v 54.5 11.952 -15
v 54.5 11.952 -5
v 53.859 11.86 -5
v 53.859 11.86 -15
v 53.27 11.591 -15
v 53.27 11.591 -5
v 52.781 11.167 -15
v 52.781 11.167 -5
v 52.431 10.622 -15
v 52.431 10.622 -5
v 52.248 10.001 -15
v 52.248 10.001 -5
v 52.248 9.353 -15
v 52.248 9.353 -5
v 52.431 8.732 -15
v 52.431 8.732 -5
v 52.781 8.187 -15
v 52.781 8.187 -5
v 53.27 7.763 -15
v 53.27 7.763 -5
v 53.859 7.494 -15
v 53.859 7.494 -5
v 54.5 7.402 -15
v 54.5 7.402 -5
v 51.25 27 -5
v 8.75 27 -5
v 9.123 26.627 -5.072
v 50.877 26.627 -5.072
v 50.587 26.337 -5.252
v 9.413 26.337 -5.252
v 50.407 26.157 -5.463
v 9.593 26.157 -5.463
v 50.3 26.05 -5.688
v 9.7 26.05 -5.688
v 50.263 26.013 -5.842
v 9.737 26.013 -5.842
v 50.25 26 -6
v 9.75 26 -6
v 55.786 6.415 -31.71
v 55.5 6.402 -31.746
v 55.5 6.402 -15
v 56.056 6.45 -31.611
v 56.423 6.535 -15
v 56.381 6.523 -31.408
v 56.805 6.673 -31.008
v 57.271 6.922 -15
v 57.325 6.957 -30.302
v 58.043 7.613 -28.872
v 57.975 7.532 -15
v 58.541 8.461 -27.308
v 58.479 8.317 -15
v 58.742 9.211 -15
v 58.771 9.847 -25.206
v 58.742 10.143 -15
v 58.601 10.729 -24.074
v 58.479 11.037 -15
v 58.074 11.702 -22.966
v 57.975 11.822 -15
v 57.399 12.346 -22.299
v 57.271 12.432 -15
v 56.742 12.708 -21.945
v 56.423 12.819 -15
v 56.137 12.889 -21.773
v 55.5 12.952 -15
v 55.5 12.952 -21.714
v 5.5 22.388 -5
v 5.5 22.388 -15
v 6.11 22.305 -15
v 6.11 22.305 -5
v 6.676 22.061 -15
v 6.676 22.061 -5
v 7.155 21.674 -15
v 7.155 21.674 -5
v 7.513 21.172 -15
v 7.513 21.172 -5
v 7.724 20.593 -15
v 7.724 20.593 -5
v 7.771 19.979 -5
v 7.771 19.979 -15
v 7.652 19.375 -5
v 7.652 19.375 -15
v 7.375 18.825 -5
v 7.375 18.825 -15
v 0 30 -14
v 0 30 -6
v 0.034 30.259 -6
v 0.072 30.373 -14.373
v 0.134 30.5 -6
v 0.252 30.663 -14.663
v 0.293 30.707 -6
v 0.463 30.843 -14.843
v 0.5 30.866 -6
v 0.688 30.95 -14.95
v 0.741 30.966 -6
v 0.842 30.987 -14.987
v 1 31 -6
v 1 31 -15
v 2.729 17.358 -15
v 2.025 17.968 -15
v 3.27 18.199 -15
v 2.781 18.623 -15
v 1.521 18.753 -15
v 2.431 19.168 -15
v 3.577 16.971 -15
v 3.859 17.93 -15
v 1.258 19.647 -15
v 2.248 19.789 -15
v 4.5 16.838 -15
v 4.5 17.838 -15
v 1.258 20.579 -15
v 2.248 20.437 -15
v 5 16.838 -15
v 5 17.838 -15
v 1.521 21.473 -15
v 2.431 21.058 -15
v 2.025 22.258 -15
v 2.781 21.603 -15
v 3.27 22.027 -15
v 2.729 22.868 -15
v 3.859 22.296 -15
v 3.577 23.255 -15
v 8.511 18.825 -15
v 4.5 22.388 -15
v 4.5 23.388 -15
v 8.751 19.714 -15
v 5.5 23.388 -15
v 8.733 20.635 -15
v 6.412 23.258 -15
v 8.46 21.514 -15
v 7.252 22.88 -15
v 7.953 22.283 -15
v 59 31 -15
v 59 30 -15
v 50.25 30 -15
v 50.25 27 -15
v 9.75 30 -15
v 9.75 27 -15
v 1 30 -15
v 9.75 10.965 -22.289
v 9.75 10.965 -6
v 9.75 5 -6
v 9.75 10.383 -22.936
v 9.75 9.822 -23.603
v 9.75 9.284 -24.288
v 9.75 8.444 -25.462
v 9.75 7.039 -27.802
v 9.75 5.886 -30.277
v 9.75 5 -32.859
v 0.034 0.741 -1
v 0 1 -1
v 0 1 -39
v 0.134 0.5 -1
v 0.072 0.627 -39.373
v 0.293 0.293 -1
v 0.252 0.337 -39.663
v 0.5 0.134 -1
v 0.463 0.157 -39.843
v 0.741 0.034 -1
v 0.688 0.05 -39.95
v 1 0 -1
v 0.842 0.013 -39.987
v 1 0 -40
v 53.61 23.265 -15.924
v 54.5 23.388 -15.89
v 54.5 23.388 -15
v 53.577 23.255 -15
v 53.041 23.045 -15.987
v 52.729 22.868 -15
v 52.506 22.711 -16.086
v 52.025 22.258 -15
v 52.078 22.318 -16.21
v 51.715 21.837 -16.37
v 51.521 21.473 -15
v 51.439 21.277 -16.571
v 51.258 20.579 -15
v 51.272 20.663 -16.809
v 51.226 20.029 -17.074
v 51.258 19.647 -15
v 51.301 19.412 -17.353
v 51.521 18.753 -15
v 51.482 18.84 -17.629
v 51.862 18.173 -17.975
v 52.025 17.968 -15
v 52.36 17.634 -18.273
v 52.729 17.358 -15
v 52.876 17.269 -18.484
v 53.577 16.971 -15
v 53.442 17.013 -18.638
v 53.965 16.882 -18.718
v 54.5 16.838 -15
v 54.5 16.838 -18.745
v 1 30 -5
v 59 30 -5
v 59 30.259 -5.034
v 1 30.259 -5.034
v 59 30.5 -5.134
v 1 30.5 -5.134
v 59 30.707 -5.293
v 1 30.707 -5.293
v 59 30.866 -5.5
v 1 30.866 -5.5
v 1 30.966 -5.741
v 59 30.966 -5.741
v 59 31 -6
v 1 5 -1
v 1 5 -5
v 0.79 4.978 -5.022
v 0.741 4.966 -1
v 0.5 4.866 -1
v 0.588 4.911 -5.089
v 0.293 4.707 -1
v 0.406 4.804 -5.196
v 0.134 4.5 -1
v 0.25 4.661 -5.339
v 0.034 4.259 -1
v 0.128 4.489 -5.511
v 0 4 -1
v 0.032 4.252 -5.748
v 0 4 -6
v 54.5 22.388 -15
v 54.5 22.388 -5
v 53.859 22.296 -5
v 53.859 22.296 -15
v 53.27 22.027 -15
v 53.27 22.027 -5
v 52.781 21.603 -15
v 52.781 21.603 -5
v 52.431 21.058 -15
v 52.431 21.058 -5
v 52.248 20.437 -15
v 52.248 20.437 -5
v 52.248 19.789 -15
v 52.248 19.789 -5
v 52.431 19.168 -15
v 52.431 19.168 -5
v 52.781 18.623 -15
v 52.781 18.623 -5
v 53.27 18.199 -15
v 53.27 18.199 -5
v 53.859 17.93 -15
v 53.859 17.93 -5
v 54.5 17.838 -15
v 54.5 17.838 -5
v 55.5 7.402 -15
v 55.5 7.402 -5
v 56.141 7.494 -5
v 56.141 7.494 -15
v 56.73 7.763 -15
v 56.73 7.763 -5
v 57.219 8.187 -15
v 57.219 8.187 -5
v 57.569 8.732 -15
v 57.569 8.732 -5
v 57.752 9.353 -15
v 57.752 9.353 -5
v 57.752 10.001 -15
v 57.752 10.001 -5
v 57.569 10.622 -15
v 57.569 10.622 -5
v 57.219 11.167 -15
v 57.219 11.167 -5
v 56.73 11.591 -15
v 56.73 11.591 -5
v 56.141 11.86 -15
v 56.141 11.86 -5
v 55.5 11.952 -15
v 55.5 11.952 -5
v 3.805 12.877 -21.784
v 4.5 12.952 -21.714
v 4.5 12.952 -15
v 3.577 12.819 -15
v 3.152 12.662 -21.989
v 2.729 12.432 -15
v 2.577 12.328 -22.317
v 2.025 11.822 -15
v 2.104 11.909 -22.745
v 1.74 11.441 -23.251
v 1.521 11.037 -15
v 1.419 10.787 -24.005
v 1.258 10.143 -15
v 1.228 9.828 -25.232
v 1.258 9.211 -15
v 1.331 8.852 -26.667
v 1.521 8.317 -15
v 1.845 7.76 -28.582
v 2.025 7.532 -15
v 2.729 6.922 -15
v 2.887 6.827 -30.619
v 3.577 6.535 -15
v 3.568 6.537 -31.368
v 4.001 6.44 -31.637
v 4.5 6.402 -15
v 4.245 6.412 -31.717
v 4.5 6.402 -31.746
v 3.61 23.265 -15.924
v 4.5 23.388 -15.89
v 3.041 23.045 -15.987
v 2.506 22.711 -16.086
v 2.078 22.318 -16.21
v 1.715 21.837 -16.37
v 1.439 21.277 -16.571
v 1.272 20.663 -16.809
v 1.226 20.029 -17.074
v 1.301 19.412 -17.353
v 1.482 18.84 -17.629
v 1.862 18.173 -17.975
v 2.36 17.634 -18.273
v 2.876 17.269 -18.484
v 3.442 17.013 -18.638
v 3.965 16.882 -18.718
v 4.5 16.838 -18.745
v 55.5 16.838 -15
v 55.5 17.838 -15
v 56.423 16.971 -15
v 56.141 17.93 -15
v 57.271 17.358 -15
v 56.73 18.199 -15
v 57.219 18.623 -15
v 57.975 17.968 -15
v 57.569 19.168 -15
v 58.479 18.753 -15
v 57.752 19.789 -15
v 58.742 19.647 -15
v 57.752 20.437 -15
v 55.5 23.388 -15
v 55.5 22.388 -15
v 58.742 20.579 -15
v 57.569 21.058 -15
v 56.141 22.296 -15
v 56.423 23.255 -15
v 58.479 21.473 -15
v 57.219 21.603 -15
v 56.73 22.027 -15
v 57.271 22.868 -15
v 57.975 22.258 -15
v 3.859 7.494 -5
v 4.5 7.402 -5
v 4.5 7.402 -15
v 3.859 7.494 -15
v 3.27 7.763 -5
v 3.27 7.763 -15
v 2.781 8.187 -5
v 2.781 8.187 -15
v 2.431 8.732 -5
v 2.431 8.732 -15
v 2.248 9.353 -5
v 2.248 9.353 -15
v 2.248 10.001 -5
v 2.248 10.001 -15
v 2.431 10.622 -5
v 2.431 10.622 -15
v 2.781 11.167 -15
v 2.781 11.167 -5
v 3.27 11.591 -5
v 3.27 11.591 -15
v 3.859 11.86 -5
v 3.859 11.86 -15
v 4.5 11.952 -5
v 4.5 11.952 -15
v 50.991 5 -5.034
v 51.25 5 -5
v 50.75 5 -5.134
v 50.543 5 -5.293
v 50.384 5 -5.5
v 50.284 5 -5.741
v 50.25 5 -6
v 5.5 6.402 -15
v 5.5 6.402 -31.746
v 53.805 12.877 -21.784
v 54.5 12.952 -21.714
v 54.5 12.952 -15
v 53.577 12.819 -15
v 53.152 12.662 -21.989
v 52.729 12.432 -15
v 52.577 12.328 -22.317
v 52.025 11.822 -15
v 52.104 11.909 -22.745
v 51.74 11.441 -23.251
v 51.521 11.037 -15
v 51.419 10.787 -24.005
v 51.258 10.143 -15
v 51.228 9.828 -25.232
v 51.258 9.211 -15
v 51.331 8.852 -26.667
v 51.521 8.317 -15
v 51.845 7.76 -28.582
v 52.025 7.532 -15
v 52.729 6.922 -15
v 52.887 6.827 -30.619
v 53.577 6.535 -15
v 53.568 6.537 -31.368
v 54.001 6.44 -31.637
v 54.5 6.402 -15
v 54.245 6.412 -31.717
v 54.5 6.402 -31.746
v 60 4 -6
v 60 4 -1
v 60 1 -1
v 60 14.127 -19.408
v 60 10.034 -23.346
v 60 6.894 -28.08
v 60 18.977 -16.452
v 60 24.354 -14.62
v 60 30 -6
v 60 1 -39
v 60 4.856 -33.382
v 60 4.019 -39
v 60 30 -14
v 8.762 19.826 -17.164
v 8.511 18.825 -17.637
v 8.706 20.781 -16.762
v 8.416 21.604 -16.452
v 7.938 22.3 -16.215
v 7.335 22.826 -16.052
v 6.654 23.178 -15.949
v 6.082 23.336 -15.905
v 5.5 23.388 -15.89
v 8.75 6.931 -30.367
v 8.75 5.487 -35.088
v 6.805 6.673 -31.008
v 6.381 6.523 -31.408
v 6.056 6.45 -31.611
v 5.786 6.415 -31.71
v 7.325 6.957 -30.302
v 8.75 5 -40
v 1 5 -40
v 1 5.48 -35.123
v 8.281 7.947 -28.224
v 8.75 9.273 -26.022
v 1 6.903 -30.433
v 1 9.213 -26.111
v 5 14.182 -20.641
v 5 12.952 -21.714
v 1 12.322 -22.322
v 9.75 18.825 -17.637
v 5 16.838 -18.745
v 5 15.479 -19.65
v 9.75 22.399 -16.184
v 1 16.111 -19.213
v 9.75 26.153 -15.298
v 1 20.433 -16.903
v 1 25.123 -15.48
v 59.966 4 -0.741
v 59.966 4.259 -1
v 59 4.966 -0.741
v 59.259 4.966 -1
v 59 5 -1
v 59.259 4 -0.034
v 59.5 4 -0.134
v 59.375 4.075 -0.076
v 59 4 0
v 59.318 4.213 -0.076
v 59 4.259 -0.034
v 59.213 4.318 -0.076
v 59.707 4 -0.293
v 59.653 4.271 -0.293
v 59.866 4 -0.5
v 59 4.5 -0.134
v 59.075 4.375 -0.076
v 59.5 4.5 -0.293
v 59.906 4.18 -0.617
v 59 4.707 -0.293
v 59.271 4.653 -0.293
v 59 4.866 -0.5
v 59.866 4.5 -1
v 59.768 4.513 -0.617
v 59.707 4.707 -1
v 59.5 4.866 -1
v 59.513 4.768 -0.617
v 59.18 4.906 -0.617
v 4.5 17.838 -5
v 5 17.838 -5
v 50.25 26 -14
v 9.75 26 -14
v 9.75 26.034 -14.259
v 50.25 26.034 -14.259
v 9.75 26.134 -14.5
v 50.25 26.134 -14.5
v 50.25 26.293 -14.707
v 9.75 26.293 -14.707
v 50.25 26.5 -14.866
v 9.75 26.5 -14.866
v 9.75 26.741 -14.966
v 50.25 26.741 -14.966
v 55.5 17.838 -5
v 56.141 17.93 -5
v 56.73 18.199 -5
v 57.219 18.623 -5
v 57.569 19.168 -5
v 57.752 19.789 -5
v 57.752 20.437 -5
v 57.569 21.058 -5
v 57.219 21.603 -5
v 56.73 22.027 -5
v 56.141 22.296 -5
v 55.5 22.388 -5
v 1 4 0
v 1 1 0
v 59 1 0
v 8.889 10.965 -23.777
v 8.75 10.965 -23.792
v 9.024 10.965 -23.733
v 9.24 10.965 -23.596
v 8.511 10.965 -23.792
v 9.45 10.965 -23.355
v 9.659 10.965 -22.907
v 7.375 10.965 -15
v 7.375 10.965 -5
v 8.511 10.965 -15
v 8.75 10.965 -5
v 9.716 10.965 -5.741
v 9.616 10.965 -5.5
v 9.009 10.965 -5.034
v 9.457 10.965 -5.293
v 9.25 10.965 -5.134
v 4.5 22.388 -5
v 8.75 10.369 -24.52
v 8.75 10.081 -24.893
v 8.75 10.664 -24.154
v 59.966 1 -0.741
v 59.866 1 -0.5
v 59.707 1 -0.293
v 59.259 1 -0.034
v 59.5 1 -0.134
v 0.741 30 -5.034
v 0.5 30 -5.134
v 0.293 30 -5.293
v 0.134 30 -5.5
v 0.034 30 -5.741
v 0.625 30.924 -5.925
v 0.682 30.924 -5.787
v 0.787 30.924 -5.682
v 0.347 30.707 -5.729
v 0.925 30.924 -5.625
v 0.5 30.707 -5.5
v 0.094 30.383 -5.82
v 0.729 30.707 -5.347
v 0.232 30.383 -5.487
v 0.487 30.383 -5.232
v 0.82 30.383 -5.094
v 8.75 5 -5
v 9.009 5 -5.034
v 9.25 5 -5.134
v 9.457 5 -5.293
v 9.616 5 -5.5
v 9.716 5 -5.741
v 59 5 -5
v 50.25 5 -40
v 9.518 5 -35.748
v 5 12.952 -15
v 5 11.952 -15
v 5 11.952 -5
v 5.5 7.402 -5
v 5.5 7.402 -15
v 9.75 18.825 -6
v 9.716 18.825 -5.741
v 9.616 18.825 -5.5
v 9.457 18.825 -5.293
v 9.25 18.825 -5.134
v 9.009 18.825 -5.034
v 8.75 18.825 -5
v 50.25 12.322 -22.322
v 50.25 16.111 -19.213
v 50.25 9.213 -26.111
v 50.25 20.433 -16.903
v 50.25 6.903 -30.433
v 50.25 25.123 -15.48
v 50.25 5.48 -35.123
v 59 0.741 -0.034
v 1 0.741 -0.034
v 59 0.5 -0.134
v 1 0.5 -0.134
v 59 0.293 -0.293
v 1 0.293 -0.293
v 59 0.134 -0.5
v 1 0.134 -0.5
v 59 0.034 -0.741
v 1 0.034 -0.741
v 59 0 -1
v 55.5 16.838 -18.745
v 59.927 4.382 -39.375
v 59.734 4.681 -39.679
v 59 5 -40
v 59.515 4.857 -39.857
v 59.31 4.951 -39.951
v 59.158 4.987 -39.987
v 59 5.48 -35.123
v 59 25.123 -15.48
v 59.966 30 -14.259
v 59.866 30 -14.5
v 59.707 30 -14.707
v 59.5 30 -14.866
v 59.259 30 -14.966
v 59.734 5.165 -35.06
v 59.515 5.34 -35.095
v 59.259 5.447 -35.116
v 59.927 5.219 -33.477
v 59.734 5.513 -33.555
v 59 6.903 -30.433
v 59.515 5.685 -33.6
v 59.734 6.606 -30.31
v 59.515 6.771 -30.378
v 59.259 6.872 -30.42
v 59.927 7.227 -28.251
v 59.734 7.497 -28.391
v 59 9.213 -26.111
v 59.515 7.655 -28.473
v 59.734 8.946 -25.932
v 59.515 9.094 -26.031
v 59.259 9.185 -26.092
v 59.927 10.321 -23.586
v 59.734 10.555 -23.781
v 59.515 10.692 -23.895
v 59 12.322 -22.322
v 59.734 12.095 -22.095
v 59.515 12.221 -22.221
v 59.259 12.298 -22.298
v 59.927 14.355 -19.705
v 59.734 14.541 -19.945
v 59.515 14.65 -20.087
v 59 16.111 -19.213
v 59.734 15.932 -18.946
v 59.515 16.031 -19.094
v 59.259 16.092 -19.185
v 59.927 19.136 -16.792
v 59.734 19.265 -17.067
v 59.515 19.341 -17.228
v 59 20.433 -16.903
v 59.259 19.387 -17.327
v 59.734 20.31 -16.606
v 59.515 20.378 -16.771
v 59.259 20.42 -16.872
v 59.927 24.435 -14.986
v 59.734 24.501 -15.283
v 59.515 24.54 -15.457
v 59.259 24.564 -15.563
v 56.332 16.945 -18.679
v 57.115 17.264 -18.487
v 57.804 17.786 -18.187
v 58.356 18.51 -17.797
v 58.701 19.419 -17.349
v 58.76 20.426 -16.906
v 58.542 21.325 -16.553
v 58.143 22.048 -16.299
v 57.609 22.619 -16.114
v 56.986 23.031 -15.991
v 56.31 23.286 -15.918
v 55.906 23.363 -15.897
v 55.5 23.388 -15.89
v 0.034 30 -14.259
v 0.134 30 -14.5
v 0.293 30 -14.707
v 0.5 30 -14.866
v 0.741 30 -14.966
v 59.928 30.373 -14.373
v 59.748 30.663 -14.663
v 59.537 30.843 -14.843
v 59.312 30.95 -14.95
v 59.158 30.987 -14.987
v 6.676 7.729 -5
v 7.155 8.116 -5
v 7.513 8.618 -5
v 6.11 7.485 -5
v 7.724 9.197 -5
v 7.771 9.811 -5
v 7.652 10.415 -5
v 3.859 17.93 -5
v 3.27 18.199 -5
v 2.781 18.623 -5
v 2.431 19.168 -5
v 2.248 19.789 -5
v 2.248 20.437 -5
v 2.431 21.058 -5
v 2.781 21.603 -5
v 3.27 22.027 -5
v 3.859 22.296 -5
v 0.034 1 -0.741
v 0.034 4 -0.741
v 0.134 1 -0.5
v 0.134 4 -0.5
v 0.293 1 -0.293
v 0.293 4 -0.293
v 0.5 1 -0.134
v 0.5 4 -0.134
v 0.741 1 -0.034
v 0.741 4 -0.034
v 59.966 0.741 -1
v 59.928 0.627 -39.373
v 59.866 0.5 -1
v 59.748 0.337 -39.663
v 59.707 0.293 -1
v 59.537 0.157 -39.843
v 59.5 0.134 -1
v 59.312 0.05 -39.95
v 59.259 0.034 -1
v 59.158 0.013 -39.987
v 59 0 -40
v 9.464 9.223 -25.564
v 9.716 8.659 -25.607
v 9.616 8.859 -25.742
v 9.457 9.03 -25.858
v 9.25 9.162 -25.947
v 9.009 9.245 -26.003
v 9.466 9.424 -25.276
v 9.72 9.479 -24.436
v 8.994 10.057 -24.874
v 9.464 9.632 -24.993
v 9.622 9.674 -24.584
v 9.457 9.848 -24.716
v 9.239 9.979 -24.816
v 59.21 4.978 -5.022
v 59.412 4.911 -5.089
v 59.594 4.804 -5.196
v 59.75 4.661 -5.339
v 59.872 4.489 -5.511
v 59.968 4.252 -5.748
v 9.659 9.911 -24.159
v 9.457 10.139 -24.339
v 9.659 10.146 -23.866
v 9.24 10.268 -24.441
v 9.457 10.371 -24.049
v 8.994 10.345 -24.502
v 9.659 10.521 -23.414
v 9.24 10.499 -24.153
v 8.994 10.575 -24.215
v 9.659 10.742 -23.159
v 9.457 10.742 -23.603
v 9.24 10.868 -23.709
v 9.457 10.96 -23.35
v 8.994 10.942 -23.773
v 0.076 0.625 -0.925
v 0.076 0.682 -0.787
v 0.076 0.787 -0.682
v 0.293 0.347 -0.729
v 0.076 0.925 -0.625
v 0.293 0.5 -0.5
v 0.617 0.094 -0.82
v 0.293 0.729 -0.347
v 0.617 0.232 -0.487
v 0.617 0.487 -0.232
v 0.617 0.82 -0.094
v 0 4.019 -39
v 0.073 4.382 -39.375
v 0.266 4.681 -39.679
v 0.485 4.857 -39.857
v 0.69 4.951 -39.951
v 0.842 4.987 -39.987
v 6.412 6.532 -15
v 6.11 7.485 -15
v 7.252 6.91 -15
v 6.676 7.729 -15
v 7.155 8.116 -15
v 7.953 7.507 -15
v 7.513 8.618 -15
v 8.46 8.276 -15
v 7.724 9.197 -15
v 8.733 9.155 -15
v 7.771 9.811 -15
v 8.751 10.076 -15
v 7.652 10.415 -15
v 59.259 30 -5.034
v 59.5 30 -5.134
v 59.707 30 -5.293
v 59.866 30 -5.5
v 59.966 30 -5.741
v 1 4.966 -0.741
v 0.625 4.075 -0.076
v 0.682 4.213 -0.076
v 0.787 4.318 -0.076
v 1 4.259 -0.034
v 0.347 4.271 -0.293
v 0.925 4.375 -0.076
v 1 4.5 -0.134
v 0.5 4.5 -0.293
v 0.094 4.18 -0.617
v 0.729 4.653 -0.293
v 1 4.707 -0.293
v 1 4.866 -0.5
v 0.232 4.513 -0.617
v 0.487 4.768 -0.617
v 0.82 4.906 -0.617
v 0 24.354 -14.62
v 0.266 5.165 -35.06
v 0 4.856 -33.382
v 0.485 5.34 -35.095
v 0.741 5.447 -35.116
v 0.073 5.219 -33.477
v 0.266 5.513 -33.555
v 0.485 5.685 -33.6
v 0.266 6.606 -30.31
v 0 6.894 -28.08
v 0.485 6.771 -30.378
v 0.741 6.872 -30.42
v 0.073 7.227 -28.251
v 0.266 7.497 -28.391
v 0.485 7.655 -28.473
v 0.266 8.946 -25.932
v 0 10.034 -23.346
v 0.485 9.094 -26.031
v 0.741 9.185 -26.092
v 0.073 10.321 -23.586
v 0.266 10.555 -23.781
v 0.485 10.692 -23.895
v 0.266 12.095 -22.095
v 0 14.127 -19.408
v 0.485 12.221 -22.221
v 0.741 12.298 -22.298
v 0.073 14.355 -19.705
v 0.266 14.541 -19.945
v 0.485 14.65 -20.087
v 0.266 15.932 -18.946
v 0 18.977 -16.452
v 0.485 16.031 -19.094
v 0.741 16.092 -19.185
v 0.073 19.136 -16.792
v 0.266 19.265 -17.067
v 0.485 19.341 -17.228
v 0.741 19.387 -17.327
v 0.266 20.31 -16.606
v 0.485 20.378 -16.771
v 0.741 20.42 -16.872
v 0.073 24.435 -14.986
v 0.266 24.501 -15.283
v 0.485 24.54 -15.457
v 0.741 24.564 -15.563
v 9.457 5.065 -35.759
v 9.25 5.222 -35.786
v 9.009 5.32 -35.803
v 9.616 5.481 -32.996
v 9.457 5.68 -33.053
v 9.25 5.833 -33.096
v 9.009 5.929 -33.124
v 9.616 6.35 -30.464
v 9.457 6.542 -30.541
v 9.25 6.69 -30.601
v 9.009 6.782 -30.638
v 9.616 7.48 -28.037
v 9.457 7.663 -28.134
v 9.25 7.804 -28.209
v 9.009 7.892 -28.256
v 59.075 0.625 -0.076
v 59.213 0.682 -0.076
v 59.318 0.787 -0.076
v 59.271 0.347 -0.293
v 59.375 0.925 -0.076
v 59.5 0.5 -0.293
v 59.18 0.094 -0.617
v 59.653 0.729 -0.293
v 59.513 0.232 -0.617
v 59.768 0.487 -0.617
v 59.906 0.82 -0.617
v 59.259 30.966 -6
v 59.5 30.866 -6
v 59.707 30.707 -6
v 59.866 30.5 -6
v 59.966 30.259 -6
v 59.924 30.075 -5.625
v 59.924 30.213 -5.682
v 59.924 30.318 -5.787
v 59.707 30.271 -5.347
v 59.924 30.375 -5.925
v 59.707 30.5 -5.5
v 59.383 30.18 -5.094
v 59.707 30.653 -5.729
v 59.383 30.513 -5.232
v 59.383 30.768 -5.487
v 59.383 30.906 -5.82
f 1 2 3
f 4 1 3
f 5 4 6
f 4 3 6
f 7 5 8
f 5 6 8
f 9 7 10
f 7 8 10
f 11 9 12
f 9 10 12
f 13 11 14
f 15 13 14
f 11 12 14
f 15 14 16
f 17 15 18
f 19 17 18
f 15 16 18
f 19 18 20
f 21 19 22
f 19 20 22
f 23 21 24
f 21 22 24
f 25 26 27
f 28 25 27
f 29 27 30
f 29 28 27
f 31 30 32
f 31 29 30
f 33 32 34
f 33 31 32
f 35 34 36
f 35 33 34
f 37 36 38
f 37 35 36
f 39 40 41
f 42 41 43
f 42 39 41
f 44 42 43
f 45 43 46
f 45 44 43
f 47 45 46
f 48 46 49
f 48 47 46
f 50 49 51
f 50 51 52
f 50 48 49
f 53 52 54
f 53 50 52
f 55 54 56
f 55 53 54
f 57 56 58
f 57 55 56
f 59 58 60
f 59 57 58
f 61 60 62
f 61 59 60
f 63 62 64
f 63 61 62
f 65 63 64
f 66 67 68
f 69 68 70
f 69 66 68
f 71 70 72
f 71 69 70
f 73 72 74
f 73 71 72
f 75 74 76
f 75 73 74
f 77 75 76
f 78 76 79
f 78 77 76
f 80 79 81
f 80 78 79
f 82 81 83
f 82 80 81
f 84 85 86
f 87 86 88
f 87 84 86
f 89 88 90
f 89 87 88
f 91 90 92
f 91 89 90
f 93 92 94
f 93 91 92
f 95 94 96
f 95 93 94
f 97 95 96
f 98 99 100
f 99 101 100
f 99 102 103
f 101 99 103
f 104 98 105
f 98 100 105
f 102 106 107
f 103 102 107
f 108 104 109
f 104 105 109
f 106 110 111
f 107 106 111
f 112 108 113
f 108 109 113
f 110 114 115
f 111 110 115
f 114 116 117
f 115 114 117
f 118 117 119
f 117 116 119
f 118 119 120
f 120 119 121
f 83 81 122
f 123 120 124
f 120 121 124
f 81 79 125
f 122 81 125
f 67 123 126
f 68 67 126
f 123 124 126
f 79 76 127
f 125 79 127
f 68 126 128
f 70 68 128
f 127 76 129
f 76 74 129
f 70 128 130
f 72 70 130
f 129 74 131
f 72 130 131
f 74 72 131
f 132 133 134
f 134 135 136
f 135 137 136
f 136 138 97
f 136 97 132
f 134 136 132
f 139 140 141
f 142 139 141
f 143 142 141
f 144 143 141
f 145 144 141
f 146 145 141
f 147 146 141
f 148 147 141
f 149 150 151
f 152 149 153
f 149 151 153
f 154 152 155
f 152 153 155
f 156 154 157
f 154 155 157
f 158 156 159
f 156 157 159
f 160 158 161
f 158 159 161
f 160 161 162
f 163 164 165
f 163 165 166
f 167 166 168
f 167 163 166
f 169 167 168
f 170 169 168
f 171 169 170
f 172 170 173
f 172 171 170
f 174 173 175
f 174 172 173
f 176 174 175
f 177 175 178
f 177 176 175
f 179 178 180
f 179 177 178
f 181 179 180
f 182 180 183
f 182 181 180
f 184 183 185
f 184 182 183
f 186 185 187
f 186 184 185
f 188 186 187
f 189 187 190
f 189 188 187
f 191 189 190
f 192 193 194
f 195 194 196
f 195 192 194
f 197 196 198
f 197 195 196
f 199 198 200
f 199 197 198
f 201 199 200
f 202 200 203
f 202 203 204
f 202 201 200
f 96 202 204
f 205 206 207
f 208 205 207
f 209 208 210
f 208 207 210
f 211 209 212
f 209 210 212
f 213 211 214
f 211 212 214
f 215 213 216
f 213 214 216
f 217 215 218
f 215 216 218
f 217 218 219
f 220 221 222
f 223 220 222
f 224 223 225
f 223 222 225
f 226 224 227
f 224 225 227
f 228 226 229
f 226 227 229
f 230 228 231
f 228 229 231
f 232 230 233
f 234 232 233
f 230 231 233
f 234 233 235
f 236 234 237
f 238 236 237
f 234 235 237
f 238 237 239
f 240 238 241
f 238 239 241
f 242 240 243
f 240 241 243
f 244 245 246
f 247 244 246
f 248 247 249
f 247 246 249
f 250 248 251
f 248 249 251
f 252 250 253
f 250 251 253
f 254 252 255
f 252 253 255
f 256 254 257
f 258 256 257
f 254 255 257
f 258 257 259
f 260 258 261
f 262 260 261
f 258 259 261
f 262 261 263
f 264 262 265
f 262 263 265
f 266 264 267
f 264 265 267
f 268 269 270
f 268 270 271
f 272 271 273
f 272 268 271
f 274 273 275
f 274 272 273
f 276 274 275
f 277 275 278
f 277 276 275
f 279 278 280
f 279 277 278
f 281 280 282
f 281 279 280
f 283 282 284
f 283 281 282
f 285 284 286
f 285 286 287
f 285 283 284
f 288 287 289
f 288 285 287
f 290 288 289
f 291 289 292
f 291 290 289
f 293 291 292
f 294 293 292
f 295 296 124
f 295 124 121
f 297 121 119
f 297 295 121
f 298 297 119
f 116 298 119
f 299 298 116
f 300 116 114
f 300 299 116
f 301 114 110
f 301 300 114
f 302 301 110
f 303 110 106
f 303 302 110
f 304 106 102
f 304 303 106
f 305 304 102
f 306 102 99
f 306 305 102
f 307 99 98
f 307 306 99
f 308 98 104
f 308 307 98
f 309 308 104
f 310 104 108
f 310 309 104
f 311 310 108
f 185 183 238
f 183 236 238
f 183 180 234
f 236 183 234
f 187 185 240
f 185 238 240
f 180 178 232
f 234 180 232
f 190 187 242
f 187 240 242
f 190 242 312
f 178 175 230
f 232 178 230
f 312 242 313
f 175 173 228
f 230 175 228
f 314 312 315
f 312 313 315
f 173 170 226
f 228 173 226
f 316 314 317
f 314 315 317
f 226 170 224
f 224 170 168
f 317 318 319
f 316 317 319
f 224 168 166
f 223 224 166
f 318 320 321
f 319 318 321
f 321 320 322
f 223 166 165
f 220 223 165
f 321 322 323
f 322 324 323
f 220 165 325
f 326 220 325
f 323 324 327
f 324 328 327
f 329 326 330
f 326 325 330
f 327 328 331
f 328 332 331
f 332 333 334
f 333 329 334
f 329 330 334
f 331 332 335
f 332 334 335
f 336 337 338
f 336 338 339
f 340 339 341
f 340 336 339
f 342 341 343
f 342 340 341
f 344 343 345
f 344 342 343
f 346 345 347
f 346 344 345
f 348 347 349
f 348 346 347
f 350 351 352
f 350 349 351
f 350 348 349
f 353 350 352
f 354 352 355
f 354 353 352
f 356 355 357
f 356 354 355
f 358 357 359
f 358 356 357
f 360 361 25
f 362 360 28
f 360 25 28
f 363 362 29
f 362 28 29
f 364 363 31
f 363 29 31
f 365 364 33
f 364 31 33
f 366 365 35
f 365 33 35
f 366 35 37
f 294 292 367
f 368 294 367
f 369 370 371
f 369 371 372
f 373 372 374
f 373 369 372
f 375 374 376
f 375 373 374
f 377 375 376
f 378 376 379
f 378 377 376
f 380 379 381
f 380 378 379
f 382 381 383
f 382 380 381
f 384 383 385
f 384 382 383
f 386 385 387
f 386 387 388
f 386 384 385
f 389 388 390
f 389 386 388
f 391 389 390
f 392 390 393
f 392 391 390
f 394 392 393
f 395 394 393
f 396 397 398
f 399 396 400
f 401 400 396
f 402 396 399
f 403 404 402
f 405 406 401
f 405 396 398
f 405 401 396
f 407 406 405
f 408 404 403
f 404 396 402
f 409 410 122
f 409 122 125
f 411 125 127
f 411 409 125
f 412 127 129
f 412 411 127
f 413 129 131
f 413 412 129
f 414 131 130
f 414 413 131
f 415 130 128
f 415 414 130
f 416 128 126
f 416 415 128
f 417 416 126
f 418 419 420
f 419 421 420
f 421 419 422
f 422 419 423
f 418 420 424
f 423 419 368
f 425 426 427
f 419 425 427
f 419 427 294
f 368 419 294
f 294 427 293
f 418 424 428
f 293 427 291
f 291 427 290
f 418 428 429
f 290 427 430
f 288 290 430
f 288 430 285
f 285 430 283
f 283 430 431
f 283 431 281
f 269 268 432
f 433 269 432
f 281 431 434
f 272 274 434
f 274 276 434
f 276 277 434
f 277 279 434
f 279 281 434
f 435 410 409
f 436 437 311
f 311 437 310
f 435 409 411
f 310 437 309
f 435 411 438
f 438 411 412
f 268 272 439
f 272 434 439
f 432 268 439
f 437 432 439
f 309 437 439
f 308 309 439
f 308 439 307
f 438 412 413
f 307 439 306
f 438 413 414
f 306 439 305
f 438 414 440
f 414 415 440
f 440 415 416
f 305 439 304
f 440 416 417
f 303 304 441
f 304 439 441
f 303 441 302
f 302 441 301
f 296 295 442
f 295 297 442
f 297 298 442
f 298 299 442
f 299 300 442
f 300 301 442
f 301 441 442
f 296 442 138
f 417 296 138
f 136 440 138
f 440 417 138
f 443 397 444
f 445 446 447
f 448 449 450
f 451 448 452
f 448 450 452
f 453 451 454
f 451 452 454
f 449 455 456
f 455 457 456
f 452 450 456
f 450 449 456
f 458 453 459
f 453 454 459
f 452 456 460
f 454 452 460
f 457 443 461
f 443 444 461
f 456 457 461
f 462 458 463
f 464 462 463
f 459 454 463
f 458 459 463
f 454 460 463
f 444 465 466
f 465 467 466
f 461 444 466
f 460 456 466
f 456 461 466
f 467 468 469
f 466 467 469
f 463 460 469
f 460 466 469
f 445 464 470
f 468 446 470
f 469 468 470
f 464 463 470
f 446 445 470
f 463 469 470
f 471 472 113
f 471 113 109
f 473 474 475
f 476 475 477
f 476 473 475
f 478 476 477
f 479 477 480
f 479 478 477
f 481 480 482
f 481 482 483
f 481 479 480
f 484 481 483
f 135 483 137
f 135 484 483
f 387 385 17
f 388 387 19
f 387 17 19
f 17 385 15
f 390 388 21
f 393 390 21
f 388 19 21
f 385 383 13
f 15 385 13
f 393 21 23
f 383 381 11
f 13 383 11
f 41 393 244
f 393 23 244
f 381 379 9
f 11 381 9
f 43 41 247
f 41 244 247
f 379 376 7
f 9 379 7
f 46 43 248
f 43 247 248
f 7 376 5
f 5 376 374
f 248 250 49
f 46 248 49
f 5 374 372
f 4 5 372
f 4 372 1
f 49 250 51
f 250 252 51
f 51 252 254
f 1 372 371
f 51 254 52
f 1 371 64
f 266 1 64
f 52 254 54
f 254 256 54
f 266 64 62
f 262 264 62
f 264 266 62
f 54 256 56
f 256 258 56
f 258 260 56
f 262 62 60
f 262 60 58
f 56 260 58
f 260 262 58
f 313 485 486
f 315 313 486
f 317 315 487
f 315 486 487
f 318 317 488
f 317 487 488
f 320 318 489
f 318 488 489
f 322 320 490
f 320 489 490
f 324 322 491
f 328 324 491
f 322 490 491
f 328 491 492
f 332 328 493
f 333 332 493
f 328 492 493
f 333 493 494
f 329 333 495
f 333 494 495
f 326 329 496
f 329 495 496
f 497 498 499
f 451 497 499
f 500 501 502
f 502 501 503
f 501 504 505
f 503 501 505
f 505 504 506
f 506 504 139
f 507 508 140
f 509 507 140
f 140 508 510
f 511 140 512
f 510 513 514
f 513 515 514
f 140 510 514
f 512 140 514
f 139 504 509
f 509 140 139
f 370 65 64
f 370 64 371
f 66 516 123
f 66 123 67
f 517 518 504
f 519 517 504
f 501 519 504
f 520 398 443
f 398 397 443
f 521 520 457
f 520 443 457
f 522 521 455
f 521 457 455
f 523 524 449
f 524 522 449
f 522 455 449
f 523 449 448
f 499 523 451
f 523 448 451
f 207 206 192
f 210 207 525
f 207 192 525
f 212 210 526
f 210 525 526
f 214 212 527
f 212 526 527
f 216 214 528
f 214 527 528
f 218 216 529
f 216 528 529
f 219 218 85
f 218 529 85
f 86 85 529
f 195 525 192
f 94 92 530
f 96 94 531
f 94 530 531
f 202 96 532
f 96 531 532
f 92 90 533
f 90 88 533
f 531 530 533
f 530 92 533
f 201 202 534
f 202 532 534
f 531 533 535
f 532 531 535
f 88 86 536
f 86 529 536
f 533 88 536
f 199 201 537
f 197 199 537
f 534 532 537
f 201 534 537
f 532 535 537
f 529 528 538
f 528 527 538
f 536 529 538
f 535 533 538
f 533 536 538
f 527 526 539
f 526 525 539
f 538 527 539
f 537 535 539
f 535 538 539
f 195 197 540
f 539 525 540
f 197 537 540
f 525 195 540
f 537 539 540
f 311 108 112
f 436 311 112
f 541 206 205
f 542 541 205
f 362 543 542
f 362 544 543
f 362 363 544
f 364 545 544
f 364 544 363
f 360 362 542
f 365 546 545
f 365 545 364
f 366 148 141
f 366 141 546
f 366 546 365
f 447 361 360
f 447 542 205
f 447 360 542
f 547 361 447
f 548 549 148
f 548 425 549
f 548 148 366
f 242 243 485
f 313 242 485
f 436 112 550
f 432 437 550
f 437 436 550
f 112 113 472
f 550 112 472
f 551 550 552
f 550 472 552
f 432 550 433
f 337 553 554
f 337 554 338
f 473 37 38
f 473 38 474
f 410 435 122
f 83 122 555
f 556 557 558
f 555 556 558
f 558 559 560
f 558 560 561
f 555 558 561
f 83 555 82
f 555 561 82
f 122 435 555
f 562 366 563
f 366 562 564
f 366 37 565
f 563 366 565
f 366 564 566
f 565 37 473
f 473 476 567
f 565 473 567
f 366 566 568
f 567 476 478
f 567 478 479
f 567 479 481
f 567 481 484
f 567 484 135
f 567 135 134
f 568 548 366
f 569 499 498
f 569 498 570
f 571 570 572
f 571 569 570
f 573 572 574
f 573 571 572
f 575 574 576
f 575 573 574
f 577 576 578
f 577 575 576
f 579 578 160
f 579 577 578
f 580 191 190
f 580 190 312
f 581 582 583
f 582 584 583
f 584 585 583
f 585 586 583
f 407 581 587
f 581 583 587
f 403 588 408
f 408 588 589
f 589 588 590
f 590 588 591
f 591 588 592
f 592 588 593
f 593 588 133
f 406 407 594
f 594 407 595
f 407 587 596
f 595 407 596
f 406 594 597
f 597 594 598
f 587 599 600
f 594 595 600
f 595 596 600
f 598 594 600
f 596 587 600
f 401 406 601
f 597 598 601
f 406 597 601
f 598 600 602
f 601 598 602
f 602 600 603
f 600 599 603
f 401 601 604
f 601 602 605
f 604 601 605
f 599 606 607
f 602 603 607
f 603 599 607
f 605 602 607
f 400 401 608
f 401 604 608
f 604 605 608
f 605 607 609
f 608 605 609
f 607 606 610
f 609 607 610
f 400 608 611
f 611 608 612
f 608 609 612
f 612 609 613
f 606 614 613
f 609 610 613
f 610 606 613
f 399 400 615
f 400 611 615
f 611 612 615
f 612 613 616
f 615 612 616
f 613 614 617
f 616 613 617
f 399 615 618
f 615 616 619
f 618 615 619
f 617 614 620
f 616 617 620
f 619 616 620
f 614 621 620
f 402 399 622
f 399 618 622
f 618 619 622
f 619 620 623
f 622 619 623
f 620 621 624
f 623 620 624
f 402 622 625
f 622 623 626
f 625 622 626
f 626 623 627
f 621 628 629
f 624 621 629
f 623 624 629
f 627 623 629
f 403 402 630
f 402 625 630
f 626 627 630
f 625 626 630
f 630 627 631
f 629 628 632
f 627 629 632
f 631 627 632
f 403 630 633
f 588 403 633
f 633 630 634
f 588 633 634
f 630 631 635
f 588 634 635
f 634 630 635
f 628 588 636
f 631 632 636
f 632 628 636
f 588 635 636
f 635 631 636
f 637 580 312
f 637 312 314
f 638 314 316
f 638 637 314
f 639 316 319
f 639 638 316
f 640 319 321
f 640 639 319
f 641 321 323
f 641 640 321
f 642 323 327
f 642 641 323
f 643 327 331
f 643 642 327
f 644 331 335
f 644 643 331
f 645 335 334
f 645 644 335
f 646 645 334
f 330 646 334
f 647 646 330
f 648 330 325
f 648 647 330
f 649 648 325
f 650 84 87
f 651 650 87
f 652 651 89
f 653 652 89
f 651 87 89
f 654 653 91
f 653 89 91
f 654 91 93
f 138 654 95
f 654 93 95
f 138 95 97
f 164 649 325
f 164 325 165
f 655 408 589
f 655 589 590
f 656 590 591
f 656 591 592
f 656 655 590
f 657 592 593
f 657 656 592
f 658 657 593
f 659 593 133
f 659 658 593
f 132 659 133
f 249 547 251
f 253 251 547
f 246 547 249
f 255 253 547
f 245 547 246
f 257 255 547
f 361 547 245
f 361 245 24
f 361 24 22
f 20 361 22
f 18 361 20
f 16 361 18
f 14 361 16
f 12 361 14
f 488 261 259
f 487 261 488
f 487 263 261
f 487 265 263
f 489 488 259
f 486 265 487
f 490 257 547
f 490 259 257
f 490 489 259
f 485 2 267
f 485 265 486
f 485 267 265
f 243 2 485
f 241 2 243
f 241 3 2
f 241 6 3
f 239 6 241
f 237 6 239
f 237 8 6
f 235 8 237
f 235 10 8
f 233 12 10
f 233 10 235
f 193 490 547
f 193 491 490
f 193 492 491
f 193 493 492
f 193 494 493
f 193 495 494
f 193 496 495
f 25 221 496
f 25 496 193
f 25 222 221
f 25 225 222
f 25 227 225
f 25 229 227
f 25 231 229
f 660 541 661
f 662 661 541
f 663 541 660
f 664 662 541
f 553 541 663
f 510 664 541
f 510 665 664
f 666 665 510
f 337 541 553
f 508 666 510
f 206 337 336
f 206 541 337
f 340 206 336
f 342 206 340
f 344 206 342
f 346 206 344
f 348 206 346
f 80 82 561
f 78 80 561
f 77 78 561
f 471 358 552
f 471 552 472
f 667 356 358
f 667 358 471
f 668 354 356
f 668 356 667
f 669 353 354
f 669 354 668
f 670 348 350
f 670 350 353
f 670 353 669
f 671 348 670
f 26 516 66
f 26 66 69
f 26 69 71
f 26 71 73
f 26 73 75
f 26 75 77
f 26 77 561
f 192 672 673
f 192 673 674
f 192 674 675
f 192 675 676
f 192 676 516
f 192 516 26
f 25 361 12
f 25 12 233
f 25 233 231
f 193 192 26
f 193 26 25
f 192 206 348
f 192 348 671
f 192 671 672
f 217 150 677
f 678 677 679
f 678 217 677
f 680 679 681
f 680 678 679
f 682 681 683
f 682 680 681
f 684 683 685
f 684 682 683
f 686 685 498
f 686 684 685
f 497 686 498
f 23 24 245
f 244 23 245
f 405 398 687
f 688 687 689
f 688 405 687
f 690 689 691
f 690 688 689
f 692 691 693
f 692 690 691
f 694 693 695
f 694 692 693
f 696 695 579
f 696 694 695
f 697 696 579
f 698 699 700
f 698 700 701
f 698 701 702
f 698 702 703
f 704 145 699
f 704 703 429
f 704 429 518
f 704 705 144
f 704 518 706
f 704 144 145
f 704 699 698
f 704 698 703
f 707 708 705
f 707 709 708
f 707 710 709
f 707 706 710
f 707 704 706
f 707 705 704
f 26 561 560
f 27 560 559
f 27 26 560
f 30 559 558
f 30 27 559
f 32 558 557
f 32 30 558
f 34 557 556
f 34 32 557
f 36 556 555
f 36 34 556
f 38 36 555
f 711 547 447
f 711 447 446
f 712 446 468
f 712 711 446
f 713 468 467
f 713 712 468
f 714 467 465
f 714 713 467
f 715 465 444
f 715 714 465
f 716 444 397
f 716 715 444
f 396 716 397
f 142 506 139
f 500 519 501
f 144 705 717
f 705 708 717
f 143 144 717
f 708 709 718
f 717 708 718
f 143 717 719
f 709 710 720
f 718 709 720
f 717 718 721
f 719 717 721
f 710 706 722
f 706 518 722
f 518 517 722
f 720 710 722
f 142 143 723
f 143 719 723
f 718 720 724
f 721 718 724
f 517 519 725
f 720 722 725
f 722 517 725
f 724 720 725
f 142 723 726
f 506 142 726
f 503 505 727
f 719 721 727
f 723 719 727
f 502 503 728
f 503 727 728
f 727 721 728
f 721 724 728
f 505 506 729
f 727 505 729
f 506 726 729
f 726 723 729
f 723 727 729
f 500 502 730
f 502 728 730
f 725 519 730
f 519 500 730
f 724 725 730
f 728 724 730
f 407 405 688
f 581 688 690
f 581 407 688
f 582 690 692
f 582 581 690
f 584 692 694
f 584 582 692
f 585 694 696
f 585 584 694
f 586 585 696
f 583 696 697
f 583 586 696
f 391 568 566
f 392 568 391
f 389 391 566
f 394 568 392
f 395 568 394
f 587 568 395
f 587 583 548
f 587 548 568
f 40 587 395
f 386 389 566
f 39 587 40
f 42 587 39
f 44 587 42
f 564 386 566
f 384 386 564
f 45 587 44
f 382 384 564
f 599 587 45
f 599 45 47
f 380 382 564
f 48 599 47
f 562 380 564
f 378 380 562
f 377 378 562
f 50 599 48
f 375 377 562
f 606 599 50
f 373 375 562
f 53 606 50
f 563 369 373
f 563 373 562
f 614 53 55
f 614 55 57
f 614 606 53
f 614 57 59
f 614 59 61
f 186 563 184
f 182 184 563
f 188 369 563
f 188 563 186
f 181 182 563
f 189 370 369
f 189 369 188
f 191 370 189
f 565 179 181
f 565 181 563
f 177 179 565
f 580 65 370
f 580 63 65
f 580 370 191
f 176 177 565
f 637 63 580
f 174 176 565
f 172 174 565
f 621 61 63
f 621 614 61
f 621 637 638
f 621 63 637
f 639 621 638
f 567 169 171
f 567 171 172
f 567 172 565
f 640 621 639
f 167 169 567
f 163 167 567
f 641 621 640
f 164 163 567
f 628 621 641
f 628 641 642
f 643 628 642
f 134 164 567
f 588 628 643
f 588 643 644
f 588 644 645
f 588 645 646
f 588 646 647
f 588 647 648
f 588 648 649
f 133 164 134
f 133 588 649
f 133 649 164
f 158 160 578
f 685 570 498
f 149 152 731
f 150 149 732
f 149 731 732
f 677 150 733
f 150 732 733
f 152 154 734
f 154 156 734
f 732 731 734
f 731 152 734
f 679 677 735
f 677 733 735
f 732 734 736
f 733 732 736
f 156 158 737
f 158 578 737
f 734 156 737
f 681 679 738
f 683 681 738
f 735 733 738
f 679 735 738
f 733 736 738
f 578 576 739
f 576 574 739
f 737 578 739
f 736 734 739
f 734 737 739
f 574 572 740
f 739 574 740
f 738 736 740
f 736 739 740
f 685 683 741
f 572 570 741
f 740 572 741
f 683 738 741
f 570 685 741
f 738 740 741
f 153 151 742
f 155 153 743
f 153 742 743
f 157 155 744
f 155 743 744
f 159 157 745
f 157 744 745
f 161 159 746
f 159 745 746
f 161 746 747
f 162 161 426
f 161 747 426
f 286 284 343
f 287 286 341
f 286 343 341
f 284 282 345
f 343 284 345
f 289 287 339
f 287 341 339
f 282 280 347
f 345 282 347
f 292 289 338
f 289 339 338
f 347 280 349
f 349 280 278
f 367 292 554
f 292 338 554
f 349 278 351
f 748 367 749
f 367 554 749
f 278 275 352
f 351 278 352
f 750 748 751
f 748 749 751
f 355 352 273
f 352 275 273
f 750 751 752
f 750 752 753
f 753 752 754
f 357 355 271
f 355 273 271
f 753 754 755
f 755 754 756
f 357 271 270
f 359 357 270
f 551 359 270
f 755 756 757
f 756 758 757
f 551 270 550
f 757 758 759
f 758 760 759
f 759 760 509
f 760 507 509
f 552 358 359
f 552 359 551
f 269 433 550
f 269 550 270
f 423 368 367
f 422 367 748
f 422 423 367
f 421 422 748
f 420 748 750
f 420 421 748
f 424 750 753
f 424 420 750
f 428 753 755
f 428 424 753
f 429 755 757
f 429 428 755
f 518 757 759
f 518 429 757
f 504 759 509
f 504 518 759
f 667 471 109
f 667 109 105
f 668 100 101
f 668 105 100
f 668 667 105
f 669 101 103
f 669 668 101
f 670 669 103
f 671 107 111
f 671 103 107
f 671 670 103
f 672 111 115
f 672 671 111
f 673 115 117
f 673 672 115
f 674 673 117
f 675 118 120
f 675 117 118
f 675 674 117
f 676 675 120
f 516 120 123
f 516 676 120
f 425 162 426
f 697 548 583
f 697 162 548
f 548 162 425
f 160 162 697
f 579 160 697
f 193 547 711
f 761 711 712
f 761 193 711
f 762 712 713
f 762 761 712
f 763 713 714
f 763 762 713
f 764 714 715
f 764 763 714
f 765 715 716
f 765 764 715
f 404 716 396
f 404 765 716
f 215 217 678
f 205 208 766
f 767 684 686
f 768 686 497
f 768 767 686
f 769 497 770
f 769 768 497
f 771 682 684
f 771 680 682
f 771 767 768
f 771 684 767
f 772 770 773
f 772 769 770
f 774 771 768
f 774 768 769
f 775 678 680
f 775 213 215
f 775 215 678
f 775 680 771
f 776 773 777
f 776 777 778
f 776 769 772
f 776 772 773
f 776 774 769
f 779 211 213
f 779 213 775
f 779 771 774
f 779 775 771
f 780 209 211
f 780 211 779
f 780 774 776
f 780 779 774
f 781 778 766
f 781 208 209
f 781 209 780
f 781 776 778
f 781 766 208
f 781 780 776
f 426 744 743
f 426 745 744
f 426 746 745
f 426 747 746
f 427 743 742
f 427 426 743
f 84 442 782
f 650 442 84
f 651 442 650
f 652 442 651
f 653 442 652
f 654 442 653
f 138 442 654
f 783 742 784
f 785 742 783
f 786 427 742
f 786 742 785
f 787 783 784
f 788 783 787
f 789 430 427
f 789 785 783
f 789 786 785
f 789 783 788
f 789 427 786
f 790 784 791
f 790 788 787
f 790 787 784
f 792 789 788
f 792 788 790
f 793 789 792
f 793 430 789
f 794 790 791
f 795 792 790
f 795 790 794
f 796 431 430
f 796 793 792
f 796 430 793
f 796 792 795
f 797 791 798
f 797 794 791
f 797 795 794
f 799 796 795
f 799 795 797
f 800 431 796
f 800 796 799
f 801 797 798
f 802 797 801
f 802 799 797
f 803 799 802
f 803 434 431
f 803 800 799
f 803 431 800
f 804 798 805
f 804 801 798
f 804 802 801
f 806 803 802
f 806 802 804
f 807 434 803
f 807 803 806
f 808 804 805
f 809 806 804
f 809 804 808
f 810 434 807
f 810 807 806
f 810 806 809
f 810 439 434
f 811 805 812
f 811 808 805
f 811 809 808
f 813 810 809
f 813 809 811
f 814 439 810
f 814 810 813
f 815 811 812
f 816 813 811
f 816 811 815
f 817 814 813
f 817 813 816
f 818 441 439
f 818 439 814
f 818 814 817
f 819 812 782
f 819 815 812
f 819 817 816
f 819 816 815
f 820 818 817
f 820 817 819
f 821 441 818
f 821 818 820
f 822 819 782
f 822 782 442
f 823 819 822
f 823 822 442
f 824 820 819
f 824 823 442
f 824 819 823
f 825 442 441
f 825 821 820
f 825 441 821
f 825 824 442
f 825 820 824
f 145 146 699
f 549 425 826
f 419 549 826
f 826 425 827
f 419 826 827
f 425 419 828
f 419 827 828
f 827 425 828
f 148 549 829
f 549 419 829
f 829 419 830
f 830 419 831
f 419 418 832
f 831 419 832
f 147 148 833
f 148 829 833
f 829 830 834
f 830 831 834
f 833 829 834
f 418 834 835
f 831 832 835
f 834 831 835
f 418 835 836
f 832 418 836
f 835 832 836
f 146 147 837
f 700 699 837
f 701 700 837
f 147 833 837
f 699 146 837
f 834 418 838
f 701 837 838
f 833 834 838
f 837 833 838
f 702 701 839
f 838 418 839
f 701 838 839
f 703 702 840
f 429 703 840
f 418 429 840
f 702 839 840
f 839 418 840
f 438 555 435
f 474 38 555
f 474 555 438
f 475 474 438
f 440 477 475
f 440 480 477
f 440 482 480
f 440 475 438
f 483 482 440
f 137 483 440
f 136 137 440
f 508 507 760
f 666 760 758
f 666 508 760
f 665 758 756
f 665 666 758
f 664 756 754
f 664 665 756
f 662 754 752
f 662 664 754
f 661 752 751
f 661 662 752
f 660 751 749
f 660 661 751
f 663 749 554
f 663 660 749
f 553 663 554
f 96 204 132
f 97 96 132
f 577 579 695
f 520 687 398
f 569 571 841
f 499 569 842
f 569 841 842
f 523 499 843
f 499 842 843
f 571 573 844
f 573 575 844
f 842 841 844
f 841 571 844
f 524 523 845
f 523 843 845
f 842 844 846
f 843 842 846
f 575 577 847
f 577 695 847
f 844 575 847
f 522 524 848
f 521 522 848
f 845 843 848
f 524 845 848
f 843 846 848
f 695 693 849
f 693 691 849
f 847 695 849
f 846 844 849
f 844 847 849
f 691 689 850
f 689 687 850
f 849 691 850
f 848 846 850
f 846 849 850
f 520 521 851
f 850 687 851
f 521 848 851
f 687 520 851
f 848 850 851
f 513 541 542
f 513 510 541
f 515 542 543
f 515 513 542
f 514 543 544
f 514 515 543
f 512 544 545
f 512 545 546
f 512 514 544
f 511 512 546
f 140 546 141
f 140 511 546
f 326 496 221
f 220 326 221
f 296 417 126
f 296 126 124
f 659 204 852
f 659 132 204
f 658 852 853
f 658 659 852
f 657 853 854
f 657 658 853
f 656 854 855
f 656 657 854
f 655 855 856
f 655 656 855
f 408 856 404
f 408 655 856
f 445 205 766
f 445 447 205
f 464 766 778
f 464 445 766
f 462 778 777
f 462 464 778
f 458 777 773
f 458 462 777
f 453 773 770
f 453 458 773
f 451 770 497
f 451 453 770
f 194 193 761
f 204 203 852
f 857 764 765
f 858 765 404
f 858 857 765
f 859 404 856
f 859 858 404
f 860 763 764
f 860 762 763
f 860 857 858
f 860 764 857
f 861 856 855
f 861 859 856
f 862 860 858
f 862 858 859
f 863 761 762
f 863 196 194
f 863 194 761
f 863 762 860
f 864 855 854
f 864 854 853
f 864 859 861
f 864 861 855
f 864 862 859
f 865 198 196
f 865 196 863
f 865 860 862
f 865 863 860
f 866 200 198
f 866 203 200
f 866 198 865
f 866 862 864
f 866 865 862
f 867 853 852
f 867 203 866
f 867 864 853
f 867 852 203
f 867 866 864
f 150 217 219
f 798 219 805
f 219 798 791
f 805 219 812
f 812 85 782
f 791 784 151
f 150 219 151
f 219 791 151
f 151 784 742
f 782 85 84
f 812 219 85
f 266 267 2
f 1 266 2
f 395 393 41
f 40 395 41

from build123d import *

# Parameters (mm, degrees)
SKETCH1_W            = 60
SKETCH1_H            = 40
BOSS_EXTRUDE1_DEPTH  = 5
SKETCH2_W            = 9.75
SKETCH2_H            = 10
BOSS_EXTRUDE2_DEPTH  = 26
BOSS_EXTRUDE3_DEPTH  = 9.75
CUT_EXTRUDE1_DEPTH   = 36
SKETCH5_W            = 10
SKETCH5_H            = 5
BOSS_EXTRUDE4_DEPTH  = 40.5
WIRE_CUT_OUT_DEPTH   = 36.0000001
WASHER_CUT_OUT_DEPTH = 25
FILLET1_R            = 1


with BuildPart() as part:
    # Sketch1 → Boss-Extrude1 (new body)
    with BuildSketch(Plane(origin=(0, 0, 0), x_dir=(1, 0, 0), z_dir=(0, 1, 0))):
        with Locations((30, 20)):
            Rectangle(SKETCH1_W, SKETCH1_H)
    extrude(amount=BOSS_EXTRUDE1_DEPTH)

    # Sketch2 → Boss-Extrude2 (add)
    with BuildSketch(Plane(origin=(0, 5, 0), x_dir=(1, 0, 0), z_dir=(0, 1, 0))):
        with Locations((4.875, 10)):
            Rectangle(SKETCH2_W, SKETCH2_H)
        with Locations((55.125, 10)):
            Rectangle(SKETCH2_W, SKETCH2_H)
    extrude(amount=BOSS_EXTRUDE2_DEPTH)

    # Sketch3 → Boss-Extrude3 (add)
    with BuildSketch(Plane.ZY):
        with BuildLine():
            Line((-15, 30), (-15, 5))
            Line((-15, 5), (-40, 5))
            ThreePointArc((-40, 5), (-22.32233047, 12.32233047), (-15, 30))
        make_face()
    boss_extrude3 = extrude(amount=-BOSS_EXTRUDE3_DEPTH)

    # Mirror2: Boss-Extrude3 across plane
    add(boss_extrude3.mirror(Plane(origin=(30, 0, 0), x_dir=(0, 0, 1), z_dir=(1, 0, 0))))

    # Sketch4 → Cut-Extrude1 (cut, through all)
    with BuildSketch(Plane.XY.offset(-5)):
        with BuildLine():
            Line((4.5, 22.388), (5.5, 22.388))
            ThreePointArc((5.5, 22.388), (7.775, 20.113), (5.5, 17.838))
            Line((5.5, 17.838), (4.5, 17.838))
            ThreePointArc((4.5, 17.838), (2.225, 20.113), (4.5, 22.388))
        make_face()
        with BuildLine():
            Line((4.5, 11.952), (5.5, 11.952))
            ThreePointArc((5.5, 11.952), (7.775, 9.677), (5.5, 7.402))
            Line((5.5, 7.402), (4.5, 7.402))
            ThreePointArc((4.5, 7.402), (2.225, 9.677), (4.5, 11.952))
        make_face()
        with BuildLine():
            Line((55.5, 11.952), (54.5, 11.952))
            ThreePointArc((54.5, 11.952), (52.225, 9.677), (54.5, 7.402))
            Line((54.5, 7.402), (55.5, 7.402))
            ThreePointArc((55.5, 7.402), (57.775, 9.677), (55.5, 11.952))
        make_face()
        with BuildLine():
            Line((55.5, 22.388), (54.5, 22.388))
            ThreePointArc((54.5, 22.388), (52.225, 20.113), (54.5, 17.838))
            Line((54.5, 17.838), (55.5, 17.838))
            ThreePointArc((55.5, 17.838), (57.775, 20.113), (55.5, 22.388))
        make_face()
    extrude(amount=-CUT_EXTRUDE1_DEPTH, mode=Mode.SUBTRACT)

    # Sketch5 → Boss-Extrude4 (add)
    with BuildSketch(Plane(origin=(9.75, 0, 0), x_dir=(0, 0, -1), z_dir=(1, 0, 0))):
        with Locations((10, 28.5)):
            Rectangle(SKETCH5_W, SKETCH5_H)
    extrude(amount=BOSS_EXTRUDE4_DEPTH)

    # Sketch6 → Wire_Cut_Out (cut, through all)
    with BuildSketch(Plane.XY.offset(-5)):
        with BuildLine():
            Line((5.5, 17.838), (5, 17.838))
            Line((5, 17.838), (5, 11.952))
            Line((5, 11.952), (5.5, 11.952))
            ThreePointArc((5.5, 11.952), (6.559361256, 11.690300457), (7.375, 10.965409873))
            Line((7.375, 10.965409873), (9.75, 10.965409873))
            Line((9.75, 10.965409873), (9.75, 18.824590127))
            Line((9.75, 18.824590127), (7.375, 18.824590127))
            ThreePointArc((7.375, 18.824590127), (6.559361256, 18.099699543), (5.5, 17.838))
        make_face()
        with BuildLine():
            Line((5, 18.824590127), (5, 17.838))
            Line((5, 17.838), (5.5, 17.838))
            ThreePointArc((5.5, 17.838), (6.559361256, 18.099699543), (7.375, 18.824590127))
            Line((7.375, 18.824590127), (5, 18.824590127))
        make_face()
        with BuildLine():
            Line((5.5, 11.952), (5, 11.952))
            Line((5, 11.952), (5, 10.965409873))
            Line((5, 10.965409873), (7.375, 10.965409873))
            ThreePointArc((7.375, 10.965409873), (6.559361256, 11.690300457), (5.5, 11.952))
        make_face()
    extrude(amount=-WIRE_CUT_OUT_DEPTH, mode=Mode.SUBTRACT)

    # Sketch8 → Washer_Cut_Out (cut)
    with BuildSketch(Plane(origin=(0, 0, -40), x_dir=(-1, 0, 0), z_dir=(0, 0, -1))):
        with BuildLine():
            Line((-55.5, 23.388), (-54.5, 23.388))
            ThreePointArc((-54.5, 23.388), (-51.225, 20.113), (-54.5, 16.838))
            Line((-54.5, 16.838), (-55.5, 16.838))
            ThreePointArc((-55.5, 16.838), (-58.775, 20.113), (-55.5, 23.388))
        make_face()
        with BuildLine():
            Line((-55.5, 12.952), (-54.5, 12.952))
            ThreePointArc((-54.5, 12.952), (-51.225, 9.677), (-54.5, 6.402))
            Line((-54.5, 6.402), (-55.5, 6.402))
            ThreePointArc((-55.5, 6.402), (-58.775, 9.677), (-55.5, 12.952))
        make_face()
        with BuildLine():
            Line((-5.5, 23.388), (-4.5, 23.388))
            ThreePointArc((-4.5, 23.388), (-1.225, 20.113), (-4.5, 16.838))
            Line((-4.5, 16.838), (-5.5, 16.838))
            ThreePointArc((-5.5, 16.838), (-8.775, 20.113), (-5.5, 23.388))
        make_face()
        with BuildLine():
            Line((-5.5, 12.952), (-4.5, 12.952))
            ThreePointArc((-4.5, 12.952), (-1.225, 9.677), (-4.5, 6.402))
            Line((-4.5, 6.402), (-5.5, 6.402))
            ThreePointArc((-5.5, 6.402), (-8.775, 9.677), (-5.5, 12.952))
        make_face()
    extrude(amount=-WASHER_CUT_OUT_DEPTH, mode=Mode.SUBTRACT)

    # Fillet1
    fillet1_edges = [part.edges().sort_by_distance(p)[0] for p in [
        (60, 5, -2.5),
        (0, 5, -2.5),
        (50.25, 15.5, -5),
        (9.75, 22.412295064, -5),
        (30, 26, -15),
        (30, 26, -5),
        (0, 30.5, -15),
        (0, 18, -5),
        (9.75, 6.538704712, -31.364745319),
        (9.75, 7.982704936, -5),
        (0, 31, -10),
        (30, 31, -5),
        (60, 18, -5),
        (60, 30.5, -15),
        (60, 31, -10),
        (0, 12.32233047, -22.32233047),
        (60, 12.32233047, -22.32233047),
        (60, 0, -20),
        (30, 0, 0),
        (0, 0, -20),
        (0, 2.5, -40),
        (60, 2.5, -40),
        (60, 2.5, 0),
        (0, 2.5, 0),
        (30, 5, 0),
    ]]
    fillet(fillet1_edges, radius=FILLET1_R)


solid = part.part
